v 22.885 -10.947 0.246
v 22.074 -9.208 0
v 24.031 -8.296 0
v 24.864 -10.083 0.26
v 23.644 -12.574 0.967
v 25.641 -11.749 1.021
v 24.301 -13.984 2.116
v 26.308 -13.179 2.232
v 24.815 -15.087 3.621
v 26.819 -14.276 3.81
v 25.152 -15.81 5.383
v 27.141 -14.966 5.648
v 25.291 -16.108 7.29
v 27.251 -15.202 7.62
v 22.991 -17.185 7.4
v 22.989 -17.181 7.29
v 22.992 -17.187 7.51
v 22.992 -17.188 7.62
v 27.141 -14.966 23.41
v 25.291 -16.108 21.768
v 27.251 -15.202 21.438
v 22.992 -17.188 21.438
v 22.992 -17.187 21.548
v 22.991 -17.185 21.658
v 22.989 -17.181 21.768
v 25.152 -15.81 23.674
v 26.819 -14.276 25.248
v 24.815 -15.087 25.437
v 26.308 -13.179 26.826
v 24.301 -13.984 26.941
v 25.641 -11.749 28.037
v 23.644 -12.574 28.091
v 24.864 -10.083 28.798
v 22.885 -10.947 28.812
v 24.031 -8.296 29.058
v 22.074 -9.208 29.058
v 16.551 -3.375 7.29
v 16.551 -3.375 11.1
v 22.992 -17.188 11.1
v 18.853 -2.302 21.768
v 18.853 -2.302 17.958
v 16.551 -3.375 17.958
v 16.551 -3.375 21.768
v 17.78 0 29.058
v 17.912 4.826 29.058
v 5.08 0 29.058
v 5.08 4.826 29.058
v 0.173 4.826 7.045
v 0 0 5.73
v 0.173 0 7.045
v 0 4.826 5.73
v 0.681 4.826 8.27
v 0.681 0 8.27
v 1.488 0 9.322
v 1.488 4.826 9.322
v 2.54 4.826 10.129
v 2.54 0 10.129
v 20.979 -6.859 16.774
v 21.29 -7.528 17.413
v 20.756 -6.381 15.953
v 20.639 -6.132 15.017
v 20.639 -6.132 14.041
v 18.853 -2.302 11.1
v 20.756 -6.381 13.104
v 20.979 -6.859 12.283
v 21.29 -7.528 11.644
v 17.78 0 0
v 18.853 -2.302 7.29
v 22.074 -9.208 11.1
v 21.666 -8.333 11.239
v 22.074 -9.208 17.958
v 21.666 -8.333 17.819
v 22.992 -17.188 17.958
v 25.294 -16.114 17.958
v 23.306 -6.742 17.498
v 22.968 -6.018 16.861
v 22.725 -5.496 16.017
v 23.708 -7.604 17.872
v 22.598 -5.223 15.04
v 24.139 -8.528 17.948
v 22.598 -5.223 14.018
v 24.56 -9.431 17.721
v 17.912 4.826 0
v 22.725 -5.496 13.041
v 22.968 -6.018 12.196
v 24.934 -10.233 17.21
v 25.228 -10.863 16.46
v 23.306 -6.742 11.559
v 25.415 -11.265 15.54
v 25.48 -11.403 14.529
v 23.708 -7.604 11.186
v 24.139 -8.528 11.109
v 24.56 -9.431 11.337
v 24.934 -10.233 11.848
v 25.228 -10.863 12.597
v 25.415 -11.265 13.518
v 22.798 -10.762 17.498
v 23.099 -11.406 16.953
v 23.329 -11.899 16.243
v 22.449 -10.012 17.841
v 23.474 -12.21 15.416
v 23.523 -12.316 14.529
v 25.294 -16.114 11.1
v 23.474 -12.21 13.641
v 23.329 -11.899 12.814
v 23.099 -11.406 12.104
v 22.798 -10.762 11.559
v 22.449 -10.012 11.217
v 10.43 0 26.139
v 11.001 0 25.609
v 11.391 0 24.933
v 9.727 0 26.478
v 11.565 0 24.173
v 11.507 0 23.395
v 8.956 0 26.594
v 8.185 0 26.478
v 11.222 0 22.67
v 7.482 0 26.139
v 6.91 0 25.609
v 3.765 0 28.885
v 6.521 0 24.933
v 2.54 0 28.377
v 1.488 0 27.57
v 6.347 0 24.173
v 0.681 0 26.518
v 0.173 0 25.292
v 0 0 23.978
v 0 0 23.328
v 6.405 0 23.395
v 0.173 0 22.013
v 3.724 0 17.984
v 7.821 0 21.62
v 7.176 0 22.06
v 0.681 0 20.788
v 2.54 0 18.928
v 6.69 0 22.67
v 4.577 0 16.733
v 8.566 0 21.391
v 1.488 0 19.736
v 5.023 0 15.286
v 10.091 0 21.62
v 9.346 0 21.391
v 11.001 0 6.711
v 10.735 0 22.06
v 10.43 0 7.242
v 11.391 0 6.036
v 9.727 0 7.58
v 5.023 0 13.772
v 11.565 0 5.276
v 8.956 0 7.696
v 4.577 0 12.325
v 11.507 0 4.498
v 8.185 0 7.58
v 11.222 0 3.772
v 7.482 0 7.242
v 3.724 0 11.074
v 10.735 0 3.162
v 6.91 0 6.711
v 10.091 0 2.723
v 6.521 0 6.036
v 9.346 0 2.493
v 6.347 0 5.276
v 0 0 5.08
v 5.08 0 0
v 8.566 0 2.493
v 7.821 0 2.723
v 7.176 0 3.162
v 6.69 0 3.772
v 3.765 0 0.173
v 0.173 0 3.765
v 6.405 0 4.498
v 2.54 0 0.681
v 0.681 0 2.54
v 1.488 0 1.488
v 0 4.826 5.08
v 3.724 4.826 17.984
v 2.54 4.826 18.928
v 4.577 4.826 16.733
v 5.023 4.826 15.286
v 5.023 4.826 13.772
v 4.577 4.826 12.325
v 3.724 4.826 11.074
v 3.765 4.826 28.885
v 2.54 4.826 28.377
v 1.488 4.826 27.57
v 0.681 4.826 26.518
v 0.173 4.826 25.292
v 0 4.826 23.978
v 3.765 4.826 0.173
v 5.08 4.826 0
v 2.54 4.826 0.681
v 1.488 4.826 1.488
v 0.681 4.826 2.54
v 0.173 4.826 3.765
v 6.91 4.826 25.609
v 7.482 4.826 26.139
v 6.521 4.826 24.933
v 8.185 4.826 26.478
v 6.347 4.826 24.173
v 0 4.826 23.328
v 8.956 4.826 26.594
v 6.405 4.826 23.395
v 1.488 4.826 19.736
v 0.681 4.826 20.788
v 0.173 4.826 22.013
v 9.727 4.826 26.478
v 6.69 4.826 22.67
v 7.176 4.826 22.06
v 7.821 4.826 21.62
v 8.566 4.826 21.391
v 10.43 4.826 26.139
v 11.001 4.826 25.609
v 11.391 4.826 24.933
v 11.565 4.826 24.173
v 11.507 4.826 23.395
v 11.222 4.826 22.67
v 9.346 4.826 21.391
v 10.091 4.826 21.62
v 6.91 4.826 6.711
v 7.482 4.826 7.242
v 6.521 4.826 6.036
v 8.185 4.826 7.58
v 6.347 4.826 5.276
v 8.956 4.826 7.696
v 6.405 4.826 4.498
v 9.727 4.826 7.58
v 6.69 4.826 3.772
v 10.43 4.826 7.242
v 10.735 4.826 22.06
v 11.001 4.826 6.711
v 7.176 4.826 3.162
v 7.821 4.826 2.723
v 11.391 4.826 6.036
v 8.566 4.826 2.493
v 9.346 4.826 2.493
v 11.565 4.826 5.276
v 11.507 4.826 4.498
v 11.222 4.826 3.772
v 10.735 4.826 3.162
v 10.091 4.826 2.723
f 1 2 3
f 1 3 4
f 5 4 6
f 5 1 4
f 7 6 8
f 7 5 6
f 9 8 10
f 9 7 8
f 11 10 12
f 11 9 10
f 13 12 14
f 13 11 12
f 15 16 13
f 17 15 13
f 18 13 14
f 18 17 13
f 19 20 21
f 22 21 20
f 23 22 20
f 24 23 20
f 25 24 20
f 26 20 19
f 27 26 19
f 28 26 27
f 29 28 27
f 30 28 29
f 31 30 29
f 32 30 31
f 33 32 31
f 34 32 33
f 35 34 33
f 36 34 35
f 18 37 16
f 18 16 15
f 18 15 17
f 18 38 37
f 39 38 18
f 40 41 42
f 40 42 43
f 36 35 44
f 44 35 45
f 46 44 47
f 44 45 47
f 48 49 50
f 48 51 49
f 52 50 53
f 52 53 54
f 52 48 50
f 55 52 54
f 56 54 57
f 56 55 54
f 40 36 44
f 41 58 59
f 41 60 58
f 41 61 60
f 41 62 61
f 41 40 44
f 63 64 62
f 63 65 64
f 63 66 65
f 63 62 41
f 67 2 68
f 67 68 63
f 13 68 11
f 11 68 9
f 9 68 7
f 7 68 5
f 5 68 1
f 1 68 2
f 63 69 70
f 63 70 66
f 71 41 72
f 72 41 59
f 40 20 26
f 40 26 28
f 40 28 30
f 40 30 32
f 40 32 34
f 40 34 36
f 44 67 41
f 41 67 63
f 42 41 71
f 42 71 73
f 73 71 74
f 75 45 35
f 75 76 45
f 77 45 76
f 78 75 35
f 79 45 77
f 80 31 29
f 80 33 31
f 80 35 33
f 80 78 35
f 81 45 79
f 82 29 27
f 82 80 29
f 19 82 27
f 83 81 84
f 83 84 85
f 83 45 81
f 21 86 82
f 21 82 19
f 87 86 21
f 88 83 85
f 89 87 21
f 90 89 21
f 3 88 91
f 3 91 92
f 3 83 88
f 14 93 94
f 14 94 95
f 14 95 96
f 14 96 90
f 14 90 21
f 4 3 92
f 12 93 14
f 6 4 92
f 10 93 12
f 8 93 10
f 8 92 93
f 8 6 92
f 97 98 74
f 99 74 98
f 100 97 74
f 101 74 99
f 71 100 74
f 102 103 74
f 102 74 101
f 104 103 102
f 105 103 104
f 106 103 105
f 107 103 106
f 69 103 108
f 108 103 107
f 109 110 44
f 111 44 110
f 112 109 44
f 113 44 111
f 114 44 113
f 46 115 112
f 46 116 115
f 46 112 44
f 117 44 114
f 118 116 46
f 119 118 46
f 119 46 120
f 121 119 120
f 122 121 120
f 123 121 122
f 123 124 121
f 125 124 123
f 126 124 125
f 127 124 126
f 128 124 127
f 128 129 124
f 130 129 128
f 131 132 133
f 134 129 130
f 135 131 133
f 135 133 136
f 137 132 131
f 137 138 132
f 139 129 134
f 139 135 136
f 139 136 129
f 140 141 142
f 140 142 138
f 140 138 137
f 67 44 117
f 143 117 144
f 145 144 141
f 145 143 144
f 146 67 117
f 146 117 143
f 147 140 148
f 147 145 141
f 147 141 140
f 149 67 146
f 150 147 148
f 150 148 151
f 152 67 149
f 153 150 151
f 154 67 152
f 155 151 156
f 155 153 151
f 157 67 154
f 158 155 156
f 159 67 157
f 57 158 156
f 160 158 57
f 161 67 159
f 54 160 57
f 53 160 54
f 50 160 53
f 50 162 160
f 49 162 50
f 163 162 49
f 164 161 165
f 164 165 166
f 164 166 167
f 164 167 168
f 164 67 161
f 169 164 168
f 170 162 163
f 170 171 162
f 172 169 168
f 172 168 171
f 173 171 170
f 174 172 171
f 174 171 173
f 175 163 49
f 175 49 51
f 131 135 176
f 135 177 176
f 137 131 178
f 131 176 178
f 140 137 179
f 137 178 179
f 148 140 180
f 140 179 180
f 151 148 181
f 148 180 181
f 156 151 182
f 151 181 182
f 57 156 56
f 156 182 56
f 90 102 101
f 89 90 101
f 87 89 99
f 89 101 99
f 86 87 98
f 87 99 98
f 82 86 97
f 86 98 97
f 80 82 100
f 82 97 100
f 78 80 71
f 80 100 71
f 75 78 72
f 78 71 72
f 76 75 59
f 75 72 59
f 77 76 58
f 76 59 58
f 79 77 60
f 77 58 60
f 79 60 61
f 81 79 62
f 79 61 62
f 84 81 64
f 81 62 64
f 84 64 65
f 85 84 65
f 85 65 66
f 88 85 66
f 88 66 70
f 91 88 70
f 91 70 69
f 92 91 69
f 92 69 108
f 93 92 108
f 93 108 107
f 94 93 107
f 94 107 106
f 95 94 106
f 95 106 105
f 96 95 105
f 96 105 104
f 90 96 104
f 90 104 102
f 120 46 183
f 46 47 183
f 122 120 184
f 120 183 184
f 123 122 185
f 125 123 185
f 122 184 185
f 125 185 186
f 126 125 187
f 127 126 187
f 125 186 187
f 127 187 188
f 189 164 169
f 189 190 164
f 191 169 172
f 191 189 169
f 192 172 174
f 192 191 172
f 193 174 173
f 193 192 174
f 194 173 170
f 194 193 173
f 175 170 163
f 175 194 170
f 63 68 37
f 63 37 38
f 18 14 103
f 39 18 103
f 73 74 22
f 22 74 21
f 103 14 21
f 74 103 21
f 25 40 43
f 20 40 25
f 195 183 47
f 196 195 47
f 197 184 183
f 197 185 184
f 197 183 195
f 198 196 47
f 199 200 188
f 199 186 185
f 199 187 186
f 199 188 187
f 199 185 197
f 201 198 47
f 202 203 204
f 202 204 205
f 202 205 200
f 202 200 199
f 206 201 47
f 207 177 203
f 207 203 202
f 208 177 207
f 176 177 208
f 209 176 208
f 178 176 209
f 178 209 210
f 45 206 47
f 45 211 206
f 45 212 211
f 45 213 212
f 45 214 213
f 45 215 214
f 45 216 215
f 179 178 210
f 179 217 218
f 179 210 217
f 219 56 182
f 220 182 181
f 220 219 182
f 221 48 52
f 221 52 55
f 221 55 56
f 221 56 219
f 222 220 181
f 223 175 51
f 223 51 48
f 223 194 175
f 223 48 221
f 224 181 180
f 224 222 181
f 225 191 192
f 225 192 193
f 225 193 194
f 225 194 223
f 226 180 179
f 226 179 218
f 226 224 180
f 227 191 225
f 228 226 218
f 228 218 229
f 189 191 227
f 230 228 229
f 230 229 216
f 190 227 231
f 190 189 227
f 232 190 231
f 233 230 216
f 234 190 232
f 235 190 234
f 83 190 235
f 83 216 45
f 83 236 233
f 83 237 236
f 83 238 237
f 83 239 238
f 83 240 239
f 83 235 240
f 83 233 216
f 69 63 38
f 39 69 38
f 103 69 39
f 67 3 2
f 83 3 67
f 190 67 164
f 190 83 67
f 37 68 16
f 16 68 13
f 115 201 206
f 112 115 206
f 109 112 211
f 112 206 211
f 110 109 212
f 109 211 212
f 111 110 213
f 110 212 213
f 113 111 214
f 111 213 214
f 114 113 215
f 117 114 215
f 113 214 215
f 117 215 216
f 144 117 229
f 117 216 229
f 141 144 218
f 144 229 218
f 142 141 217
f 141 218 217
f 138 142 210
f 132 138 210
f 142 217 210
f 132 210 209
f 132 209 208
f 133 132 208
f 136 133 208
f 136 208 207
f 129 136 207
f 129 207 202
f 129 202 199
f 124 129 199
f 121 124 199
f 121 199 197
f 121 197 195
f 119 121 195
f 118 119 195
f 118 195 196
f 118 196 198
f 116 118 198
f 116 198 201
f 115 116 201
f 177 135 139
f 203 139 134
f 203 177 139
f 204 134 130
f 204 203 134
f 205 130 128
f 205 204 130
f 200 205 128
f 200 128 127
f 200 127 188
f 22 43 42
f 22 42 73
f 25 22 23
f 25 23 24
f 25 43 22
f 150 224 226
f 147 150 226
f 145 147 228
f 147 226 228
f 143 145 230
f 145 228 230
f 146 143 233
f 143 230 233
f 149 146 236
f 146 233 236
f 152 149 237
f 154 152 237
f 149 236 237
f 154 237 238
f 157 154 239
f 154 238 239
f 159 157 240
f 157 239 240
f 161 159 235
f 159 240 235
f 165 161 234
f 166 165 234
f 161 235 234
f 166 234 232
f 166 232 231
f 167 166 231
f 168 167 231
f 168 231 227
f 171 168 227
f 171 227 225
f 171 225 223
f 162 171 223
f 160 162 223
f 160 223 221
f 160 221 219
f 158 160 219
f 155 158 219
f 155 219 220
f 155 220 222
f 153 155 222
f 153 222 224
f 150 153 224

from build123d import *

# Parameters (mm, degrees)
BOSS_EXTRUDE1_DEPTH = 29.057599999999997
SKETCH3_R           = 3.4290000000000025
CUT_EXTRUDE2_DEPTH  = 40.78888094416812
SKETCH3_3_W         = 15.239999999999998
SKETCH3_3_H         = 3.8099999999999987
SKETCH3_3_W_2       = 15.239999999999997
SKETCH3_3_H_2       = 3.8100000000000014
BOSS_EXTRUDE2_DEPTH = 2.54
SKETCH2_R           = 2.6161999999999974
CUT_EXTRUDE1_DEPTH  = 46.51431433261163
FILLET7_R           = 5.08
FILLET8_R           = 7.619999999999999
SKETCH4_R           = 5.08
CUT_EXTRUDE3_DEPTH  = 10.16
FILLET9_R           = 5.08


with BuildPart() as part:
    # Sketch1 → Boss-Extrude1 (new body)
    with BuildSketch(Plane.XY):
        Polygon((0, 0), (0, 4.826), (17.91179216878401, 4.825999999999999), (27.250871205961722, -15.201719626413484), (25.29415269374959, -16.114152453511647), (17.779999999999998, 7.8e-16), align=None)
    extrude(amount=BOSS_EXTRUDE1_DEPTH)

    # Sketch3 → Cut-Extrude2 (cut, through all)
    with BuildSketch(Plane(origin=(14.604381850113365, 6.810135099327686, 0), x_dir=(0.4226182617406973, -0.9063077870366509, 0), z_dir=(-0.906307787036651, -0.42261826174069733, 0))):
        with Locations((17.674152693749598, 14.528799999999999)):
            Circle(SKETCH3_R)
    extrude(amount=-CUT_EXTRUDE2_DEPTH, mode=Mode.SUBTRACT)

    # Sketch3<3> → Boss-Extrude2 (add)
    with BuildSketch(Plane(origin=(14.604381850113365, 6.810135099327686, 0), x_dir=(0.4226182617406973, -0.9063077870366509, 0), z_dir=(-0.906307787036651, -0.42261826174069733, 0))):
        with Locations((17.67415269374959, 19.8628)):
            Rectangle(SKETCH3_3_W, SKETCH3_3_H)
        with Locations((17.674152693749594, 9.194799999999997)):
            Rectangle(SKETCH3_3_W_2, SKETCH3_3_H_2)
    extrude(amount=BOSS_EXTRUDE2_DEPTH)

    # Sketch2 → Cut-Extrude1 (cut, through all)
    with BuildSketch(Plane(origin=(2.3e-16, 4.826, 0), x_dir=(1, 0, 0), z_dir=(0, 1, 0))):
        with Locations((8.955896084392007, -5.079999999999997)):
            Circle(SKETCH2_R)
        with Locations((8.955896084392007, -23.9776)):
            Circle(SKETCH2_R)
    extrude(amount=-CUT_EXTRUDE1_DEPTH, mode=Mode.SUBTRACT)

    # Fillet7
    fillet7_edges = [part.edges().sort_by_distance(p)[0] for p in [
        (0, 2.413, 0),
        (0, 2.413, 29.057599999999997),
    ]]
    fillet(fillet7_edges, radius=FILLET7_R)

    # Fillet8
    fillet8_edges = [part.edges().sort_by_distance(p)[0] for p in [
        (26.272511949855655, -15.657936039962564, 0),
        (26.272511949855655, -15.657936039962564, 29.057599999999997),
    ]]
    fillet(fillet8_edges, radius=FILLET8_R)

    # Sketch4 → Cut-Extrude3 (cut)
    with BuildSketch(Plane(origin=(2.3e-16, 4.826, 0), x_dir=(1, 0, 0), z_dir=(0, 1, 0))):
        with Locations((0, -14.528799999999999)):
            Circle(SKETCH4_R)
    extrude(amount=-CUT_EXTRUDE3_DEPTH, mode=Mode.SUBTRACT)

    # Fillet9
    fillet9_edges = [part.edges().sort_by_distance(p)[0] for p in [
        (0, 2.413, 19.6088),
        (0, 2.413, 9.448799999999999),
    ]]
    fillet(fillet9_edges, radius=FILLET9_R)


solid = part.part
